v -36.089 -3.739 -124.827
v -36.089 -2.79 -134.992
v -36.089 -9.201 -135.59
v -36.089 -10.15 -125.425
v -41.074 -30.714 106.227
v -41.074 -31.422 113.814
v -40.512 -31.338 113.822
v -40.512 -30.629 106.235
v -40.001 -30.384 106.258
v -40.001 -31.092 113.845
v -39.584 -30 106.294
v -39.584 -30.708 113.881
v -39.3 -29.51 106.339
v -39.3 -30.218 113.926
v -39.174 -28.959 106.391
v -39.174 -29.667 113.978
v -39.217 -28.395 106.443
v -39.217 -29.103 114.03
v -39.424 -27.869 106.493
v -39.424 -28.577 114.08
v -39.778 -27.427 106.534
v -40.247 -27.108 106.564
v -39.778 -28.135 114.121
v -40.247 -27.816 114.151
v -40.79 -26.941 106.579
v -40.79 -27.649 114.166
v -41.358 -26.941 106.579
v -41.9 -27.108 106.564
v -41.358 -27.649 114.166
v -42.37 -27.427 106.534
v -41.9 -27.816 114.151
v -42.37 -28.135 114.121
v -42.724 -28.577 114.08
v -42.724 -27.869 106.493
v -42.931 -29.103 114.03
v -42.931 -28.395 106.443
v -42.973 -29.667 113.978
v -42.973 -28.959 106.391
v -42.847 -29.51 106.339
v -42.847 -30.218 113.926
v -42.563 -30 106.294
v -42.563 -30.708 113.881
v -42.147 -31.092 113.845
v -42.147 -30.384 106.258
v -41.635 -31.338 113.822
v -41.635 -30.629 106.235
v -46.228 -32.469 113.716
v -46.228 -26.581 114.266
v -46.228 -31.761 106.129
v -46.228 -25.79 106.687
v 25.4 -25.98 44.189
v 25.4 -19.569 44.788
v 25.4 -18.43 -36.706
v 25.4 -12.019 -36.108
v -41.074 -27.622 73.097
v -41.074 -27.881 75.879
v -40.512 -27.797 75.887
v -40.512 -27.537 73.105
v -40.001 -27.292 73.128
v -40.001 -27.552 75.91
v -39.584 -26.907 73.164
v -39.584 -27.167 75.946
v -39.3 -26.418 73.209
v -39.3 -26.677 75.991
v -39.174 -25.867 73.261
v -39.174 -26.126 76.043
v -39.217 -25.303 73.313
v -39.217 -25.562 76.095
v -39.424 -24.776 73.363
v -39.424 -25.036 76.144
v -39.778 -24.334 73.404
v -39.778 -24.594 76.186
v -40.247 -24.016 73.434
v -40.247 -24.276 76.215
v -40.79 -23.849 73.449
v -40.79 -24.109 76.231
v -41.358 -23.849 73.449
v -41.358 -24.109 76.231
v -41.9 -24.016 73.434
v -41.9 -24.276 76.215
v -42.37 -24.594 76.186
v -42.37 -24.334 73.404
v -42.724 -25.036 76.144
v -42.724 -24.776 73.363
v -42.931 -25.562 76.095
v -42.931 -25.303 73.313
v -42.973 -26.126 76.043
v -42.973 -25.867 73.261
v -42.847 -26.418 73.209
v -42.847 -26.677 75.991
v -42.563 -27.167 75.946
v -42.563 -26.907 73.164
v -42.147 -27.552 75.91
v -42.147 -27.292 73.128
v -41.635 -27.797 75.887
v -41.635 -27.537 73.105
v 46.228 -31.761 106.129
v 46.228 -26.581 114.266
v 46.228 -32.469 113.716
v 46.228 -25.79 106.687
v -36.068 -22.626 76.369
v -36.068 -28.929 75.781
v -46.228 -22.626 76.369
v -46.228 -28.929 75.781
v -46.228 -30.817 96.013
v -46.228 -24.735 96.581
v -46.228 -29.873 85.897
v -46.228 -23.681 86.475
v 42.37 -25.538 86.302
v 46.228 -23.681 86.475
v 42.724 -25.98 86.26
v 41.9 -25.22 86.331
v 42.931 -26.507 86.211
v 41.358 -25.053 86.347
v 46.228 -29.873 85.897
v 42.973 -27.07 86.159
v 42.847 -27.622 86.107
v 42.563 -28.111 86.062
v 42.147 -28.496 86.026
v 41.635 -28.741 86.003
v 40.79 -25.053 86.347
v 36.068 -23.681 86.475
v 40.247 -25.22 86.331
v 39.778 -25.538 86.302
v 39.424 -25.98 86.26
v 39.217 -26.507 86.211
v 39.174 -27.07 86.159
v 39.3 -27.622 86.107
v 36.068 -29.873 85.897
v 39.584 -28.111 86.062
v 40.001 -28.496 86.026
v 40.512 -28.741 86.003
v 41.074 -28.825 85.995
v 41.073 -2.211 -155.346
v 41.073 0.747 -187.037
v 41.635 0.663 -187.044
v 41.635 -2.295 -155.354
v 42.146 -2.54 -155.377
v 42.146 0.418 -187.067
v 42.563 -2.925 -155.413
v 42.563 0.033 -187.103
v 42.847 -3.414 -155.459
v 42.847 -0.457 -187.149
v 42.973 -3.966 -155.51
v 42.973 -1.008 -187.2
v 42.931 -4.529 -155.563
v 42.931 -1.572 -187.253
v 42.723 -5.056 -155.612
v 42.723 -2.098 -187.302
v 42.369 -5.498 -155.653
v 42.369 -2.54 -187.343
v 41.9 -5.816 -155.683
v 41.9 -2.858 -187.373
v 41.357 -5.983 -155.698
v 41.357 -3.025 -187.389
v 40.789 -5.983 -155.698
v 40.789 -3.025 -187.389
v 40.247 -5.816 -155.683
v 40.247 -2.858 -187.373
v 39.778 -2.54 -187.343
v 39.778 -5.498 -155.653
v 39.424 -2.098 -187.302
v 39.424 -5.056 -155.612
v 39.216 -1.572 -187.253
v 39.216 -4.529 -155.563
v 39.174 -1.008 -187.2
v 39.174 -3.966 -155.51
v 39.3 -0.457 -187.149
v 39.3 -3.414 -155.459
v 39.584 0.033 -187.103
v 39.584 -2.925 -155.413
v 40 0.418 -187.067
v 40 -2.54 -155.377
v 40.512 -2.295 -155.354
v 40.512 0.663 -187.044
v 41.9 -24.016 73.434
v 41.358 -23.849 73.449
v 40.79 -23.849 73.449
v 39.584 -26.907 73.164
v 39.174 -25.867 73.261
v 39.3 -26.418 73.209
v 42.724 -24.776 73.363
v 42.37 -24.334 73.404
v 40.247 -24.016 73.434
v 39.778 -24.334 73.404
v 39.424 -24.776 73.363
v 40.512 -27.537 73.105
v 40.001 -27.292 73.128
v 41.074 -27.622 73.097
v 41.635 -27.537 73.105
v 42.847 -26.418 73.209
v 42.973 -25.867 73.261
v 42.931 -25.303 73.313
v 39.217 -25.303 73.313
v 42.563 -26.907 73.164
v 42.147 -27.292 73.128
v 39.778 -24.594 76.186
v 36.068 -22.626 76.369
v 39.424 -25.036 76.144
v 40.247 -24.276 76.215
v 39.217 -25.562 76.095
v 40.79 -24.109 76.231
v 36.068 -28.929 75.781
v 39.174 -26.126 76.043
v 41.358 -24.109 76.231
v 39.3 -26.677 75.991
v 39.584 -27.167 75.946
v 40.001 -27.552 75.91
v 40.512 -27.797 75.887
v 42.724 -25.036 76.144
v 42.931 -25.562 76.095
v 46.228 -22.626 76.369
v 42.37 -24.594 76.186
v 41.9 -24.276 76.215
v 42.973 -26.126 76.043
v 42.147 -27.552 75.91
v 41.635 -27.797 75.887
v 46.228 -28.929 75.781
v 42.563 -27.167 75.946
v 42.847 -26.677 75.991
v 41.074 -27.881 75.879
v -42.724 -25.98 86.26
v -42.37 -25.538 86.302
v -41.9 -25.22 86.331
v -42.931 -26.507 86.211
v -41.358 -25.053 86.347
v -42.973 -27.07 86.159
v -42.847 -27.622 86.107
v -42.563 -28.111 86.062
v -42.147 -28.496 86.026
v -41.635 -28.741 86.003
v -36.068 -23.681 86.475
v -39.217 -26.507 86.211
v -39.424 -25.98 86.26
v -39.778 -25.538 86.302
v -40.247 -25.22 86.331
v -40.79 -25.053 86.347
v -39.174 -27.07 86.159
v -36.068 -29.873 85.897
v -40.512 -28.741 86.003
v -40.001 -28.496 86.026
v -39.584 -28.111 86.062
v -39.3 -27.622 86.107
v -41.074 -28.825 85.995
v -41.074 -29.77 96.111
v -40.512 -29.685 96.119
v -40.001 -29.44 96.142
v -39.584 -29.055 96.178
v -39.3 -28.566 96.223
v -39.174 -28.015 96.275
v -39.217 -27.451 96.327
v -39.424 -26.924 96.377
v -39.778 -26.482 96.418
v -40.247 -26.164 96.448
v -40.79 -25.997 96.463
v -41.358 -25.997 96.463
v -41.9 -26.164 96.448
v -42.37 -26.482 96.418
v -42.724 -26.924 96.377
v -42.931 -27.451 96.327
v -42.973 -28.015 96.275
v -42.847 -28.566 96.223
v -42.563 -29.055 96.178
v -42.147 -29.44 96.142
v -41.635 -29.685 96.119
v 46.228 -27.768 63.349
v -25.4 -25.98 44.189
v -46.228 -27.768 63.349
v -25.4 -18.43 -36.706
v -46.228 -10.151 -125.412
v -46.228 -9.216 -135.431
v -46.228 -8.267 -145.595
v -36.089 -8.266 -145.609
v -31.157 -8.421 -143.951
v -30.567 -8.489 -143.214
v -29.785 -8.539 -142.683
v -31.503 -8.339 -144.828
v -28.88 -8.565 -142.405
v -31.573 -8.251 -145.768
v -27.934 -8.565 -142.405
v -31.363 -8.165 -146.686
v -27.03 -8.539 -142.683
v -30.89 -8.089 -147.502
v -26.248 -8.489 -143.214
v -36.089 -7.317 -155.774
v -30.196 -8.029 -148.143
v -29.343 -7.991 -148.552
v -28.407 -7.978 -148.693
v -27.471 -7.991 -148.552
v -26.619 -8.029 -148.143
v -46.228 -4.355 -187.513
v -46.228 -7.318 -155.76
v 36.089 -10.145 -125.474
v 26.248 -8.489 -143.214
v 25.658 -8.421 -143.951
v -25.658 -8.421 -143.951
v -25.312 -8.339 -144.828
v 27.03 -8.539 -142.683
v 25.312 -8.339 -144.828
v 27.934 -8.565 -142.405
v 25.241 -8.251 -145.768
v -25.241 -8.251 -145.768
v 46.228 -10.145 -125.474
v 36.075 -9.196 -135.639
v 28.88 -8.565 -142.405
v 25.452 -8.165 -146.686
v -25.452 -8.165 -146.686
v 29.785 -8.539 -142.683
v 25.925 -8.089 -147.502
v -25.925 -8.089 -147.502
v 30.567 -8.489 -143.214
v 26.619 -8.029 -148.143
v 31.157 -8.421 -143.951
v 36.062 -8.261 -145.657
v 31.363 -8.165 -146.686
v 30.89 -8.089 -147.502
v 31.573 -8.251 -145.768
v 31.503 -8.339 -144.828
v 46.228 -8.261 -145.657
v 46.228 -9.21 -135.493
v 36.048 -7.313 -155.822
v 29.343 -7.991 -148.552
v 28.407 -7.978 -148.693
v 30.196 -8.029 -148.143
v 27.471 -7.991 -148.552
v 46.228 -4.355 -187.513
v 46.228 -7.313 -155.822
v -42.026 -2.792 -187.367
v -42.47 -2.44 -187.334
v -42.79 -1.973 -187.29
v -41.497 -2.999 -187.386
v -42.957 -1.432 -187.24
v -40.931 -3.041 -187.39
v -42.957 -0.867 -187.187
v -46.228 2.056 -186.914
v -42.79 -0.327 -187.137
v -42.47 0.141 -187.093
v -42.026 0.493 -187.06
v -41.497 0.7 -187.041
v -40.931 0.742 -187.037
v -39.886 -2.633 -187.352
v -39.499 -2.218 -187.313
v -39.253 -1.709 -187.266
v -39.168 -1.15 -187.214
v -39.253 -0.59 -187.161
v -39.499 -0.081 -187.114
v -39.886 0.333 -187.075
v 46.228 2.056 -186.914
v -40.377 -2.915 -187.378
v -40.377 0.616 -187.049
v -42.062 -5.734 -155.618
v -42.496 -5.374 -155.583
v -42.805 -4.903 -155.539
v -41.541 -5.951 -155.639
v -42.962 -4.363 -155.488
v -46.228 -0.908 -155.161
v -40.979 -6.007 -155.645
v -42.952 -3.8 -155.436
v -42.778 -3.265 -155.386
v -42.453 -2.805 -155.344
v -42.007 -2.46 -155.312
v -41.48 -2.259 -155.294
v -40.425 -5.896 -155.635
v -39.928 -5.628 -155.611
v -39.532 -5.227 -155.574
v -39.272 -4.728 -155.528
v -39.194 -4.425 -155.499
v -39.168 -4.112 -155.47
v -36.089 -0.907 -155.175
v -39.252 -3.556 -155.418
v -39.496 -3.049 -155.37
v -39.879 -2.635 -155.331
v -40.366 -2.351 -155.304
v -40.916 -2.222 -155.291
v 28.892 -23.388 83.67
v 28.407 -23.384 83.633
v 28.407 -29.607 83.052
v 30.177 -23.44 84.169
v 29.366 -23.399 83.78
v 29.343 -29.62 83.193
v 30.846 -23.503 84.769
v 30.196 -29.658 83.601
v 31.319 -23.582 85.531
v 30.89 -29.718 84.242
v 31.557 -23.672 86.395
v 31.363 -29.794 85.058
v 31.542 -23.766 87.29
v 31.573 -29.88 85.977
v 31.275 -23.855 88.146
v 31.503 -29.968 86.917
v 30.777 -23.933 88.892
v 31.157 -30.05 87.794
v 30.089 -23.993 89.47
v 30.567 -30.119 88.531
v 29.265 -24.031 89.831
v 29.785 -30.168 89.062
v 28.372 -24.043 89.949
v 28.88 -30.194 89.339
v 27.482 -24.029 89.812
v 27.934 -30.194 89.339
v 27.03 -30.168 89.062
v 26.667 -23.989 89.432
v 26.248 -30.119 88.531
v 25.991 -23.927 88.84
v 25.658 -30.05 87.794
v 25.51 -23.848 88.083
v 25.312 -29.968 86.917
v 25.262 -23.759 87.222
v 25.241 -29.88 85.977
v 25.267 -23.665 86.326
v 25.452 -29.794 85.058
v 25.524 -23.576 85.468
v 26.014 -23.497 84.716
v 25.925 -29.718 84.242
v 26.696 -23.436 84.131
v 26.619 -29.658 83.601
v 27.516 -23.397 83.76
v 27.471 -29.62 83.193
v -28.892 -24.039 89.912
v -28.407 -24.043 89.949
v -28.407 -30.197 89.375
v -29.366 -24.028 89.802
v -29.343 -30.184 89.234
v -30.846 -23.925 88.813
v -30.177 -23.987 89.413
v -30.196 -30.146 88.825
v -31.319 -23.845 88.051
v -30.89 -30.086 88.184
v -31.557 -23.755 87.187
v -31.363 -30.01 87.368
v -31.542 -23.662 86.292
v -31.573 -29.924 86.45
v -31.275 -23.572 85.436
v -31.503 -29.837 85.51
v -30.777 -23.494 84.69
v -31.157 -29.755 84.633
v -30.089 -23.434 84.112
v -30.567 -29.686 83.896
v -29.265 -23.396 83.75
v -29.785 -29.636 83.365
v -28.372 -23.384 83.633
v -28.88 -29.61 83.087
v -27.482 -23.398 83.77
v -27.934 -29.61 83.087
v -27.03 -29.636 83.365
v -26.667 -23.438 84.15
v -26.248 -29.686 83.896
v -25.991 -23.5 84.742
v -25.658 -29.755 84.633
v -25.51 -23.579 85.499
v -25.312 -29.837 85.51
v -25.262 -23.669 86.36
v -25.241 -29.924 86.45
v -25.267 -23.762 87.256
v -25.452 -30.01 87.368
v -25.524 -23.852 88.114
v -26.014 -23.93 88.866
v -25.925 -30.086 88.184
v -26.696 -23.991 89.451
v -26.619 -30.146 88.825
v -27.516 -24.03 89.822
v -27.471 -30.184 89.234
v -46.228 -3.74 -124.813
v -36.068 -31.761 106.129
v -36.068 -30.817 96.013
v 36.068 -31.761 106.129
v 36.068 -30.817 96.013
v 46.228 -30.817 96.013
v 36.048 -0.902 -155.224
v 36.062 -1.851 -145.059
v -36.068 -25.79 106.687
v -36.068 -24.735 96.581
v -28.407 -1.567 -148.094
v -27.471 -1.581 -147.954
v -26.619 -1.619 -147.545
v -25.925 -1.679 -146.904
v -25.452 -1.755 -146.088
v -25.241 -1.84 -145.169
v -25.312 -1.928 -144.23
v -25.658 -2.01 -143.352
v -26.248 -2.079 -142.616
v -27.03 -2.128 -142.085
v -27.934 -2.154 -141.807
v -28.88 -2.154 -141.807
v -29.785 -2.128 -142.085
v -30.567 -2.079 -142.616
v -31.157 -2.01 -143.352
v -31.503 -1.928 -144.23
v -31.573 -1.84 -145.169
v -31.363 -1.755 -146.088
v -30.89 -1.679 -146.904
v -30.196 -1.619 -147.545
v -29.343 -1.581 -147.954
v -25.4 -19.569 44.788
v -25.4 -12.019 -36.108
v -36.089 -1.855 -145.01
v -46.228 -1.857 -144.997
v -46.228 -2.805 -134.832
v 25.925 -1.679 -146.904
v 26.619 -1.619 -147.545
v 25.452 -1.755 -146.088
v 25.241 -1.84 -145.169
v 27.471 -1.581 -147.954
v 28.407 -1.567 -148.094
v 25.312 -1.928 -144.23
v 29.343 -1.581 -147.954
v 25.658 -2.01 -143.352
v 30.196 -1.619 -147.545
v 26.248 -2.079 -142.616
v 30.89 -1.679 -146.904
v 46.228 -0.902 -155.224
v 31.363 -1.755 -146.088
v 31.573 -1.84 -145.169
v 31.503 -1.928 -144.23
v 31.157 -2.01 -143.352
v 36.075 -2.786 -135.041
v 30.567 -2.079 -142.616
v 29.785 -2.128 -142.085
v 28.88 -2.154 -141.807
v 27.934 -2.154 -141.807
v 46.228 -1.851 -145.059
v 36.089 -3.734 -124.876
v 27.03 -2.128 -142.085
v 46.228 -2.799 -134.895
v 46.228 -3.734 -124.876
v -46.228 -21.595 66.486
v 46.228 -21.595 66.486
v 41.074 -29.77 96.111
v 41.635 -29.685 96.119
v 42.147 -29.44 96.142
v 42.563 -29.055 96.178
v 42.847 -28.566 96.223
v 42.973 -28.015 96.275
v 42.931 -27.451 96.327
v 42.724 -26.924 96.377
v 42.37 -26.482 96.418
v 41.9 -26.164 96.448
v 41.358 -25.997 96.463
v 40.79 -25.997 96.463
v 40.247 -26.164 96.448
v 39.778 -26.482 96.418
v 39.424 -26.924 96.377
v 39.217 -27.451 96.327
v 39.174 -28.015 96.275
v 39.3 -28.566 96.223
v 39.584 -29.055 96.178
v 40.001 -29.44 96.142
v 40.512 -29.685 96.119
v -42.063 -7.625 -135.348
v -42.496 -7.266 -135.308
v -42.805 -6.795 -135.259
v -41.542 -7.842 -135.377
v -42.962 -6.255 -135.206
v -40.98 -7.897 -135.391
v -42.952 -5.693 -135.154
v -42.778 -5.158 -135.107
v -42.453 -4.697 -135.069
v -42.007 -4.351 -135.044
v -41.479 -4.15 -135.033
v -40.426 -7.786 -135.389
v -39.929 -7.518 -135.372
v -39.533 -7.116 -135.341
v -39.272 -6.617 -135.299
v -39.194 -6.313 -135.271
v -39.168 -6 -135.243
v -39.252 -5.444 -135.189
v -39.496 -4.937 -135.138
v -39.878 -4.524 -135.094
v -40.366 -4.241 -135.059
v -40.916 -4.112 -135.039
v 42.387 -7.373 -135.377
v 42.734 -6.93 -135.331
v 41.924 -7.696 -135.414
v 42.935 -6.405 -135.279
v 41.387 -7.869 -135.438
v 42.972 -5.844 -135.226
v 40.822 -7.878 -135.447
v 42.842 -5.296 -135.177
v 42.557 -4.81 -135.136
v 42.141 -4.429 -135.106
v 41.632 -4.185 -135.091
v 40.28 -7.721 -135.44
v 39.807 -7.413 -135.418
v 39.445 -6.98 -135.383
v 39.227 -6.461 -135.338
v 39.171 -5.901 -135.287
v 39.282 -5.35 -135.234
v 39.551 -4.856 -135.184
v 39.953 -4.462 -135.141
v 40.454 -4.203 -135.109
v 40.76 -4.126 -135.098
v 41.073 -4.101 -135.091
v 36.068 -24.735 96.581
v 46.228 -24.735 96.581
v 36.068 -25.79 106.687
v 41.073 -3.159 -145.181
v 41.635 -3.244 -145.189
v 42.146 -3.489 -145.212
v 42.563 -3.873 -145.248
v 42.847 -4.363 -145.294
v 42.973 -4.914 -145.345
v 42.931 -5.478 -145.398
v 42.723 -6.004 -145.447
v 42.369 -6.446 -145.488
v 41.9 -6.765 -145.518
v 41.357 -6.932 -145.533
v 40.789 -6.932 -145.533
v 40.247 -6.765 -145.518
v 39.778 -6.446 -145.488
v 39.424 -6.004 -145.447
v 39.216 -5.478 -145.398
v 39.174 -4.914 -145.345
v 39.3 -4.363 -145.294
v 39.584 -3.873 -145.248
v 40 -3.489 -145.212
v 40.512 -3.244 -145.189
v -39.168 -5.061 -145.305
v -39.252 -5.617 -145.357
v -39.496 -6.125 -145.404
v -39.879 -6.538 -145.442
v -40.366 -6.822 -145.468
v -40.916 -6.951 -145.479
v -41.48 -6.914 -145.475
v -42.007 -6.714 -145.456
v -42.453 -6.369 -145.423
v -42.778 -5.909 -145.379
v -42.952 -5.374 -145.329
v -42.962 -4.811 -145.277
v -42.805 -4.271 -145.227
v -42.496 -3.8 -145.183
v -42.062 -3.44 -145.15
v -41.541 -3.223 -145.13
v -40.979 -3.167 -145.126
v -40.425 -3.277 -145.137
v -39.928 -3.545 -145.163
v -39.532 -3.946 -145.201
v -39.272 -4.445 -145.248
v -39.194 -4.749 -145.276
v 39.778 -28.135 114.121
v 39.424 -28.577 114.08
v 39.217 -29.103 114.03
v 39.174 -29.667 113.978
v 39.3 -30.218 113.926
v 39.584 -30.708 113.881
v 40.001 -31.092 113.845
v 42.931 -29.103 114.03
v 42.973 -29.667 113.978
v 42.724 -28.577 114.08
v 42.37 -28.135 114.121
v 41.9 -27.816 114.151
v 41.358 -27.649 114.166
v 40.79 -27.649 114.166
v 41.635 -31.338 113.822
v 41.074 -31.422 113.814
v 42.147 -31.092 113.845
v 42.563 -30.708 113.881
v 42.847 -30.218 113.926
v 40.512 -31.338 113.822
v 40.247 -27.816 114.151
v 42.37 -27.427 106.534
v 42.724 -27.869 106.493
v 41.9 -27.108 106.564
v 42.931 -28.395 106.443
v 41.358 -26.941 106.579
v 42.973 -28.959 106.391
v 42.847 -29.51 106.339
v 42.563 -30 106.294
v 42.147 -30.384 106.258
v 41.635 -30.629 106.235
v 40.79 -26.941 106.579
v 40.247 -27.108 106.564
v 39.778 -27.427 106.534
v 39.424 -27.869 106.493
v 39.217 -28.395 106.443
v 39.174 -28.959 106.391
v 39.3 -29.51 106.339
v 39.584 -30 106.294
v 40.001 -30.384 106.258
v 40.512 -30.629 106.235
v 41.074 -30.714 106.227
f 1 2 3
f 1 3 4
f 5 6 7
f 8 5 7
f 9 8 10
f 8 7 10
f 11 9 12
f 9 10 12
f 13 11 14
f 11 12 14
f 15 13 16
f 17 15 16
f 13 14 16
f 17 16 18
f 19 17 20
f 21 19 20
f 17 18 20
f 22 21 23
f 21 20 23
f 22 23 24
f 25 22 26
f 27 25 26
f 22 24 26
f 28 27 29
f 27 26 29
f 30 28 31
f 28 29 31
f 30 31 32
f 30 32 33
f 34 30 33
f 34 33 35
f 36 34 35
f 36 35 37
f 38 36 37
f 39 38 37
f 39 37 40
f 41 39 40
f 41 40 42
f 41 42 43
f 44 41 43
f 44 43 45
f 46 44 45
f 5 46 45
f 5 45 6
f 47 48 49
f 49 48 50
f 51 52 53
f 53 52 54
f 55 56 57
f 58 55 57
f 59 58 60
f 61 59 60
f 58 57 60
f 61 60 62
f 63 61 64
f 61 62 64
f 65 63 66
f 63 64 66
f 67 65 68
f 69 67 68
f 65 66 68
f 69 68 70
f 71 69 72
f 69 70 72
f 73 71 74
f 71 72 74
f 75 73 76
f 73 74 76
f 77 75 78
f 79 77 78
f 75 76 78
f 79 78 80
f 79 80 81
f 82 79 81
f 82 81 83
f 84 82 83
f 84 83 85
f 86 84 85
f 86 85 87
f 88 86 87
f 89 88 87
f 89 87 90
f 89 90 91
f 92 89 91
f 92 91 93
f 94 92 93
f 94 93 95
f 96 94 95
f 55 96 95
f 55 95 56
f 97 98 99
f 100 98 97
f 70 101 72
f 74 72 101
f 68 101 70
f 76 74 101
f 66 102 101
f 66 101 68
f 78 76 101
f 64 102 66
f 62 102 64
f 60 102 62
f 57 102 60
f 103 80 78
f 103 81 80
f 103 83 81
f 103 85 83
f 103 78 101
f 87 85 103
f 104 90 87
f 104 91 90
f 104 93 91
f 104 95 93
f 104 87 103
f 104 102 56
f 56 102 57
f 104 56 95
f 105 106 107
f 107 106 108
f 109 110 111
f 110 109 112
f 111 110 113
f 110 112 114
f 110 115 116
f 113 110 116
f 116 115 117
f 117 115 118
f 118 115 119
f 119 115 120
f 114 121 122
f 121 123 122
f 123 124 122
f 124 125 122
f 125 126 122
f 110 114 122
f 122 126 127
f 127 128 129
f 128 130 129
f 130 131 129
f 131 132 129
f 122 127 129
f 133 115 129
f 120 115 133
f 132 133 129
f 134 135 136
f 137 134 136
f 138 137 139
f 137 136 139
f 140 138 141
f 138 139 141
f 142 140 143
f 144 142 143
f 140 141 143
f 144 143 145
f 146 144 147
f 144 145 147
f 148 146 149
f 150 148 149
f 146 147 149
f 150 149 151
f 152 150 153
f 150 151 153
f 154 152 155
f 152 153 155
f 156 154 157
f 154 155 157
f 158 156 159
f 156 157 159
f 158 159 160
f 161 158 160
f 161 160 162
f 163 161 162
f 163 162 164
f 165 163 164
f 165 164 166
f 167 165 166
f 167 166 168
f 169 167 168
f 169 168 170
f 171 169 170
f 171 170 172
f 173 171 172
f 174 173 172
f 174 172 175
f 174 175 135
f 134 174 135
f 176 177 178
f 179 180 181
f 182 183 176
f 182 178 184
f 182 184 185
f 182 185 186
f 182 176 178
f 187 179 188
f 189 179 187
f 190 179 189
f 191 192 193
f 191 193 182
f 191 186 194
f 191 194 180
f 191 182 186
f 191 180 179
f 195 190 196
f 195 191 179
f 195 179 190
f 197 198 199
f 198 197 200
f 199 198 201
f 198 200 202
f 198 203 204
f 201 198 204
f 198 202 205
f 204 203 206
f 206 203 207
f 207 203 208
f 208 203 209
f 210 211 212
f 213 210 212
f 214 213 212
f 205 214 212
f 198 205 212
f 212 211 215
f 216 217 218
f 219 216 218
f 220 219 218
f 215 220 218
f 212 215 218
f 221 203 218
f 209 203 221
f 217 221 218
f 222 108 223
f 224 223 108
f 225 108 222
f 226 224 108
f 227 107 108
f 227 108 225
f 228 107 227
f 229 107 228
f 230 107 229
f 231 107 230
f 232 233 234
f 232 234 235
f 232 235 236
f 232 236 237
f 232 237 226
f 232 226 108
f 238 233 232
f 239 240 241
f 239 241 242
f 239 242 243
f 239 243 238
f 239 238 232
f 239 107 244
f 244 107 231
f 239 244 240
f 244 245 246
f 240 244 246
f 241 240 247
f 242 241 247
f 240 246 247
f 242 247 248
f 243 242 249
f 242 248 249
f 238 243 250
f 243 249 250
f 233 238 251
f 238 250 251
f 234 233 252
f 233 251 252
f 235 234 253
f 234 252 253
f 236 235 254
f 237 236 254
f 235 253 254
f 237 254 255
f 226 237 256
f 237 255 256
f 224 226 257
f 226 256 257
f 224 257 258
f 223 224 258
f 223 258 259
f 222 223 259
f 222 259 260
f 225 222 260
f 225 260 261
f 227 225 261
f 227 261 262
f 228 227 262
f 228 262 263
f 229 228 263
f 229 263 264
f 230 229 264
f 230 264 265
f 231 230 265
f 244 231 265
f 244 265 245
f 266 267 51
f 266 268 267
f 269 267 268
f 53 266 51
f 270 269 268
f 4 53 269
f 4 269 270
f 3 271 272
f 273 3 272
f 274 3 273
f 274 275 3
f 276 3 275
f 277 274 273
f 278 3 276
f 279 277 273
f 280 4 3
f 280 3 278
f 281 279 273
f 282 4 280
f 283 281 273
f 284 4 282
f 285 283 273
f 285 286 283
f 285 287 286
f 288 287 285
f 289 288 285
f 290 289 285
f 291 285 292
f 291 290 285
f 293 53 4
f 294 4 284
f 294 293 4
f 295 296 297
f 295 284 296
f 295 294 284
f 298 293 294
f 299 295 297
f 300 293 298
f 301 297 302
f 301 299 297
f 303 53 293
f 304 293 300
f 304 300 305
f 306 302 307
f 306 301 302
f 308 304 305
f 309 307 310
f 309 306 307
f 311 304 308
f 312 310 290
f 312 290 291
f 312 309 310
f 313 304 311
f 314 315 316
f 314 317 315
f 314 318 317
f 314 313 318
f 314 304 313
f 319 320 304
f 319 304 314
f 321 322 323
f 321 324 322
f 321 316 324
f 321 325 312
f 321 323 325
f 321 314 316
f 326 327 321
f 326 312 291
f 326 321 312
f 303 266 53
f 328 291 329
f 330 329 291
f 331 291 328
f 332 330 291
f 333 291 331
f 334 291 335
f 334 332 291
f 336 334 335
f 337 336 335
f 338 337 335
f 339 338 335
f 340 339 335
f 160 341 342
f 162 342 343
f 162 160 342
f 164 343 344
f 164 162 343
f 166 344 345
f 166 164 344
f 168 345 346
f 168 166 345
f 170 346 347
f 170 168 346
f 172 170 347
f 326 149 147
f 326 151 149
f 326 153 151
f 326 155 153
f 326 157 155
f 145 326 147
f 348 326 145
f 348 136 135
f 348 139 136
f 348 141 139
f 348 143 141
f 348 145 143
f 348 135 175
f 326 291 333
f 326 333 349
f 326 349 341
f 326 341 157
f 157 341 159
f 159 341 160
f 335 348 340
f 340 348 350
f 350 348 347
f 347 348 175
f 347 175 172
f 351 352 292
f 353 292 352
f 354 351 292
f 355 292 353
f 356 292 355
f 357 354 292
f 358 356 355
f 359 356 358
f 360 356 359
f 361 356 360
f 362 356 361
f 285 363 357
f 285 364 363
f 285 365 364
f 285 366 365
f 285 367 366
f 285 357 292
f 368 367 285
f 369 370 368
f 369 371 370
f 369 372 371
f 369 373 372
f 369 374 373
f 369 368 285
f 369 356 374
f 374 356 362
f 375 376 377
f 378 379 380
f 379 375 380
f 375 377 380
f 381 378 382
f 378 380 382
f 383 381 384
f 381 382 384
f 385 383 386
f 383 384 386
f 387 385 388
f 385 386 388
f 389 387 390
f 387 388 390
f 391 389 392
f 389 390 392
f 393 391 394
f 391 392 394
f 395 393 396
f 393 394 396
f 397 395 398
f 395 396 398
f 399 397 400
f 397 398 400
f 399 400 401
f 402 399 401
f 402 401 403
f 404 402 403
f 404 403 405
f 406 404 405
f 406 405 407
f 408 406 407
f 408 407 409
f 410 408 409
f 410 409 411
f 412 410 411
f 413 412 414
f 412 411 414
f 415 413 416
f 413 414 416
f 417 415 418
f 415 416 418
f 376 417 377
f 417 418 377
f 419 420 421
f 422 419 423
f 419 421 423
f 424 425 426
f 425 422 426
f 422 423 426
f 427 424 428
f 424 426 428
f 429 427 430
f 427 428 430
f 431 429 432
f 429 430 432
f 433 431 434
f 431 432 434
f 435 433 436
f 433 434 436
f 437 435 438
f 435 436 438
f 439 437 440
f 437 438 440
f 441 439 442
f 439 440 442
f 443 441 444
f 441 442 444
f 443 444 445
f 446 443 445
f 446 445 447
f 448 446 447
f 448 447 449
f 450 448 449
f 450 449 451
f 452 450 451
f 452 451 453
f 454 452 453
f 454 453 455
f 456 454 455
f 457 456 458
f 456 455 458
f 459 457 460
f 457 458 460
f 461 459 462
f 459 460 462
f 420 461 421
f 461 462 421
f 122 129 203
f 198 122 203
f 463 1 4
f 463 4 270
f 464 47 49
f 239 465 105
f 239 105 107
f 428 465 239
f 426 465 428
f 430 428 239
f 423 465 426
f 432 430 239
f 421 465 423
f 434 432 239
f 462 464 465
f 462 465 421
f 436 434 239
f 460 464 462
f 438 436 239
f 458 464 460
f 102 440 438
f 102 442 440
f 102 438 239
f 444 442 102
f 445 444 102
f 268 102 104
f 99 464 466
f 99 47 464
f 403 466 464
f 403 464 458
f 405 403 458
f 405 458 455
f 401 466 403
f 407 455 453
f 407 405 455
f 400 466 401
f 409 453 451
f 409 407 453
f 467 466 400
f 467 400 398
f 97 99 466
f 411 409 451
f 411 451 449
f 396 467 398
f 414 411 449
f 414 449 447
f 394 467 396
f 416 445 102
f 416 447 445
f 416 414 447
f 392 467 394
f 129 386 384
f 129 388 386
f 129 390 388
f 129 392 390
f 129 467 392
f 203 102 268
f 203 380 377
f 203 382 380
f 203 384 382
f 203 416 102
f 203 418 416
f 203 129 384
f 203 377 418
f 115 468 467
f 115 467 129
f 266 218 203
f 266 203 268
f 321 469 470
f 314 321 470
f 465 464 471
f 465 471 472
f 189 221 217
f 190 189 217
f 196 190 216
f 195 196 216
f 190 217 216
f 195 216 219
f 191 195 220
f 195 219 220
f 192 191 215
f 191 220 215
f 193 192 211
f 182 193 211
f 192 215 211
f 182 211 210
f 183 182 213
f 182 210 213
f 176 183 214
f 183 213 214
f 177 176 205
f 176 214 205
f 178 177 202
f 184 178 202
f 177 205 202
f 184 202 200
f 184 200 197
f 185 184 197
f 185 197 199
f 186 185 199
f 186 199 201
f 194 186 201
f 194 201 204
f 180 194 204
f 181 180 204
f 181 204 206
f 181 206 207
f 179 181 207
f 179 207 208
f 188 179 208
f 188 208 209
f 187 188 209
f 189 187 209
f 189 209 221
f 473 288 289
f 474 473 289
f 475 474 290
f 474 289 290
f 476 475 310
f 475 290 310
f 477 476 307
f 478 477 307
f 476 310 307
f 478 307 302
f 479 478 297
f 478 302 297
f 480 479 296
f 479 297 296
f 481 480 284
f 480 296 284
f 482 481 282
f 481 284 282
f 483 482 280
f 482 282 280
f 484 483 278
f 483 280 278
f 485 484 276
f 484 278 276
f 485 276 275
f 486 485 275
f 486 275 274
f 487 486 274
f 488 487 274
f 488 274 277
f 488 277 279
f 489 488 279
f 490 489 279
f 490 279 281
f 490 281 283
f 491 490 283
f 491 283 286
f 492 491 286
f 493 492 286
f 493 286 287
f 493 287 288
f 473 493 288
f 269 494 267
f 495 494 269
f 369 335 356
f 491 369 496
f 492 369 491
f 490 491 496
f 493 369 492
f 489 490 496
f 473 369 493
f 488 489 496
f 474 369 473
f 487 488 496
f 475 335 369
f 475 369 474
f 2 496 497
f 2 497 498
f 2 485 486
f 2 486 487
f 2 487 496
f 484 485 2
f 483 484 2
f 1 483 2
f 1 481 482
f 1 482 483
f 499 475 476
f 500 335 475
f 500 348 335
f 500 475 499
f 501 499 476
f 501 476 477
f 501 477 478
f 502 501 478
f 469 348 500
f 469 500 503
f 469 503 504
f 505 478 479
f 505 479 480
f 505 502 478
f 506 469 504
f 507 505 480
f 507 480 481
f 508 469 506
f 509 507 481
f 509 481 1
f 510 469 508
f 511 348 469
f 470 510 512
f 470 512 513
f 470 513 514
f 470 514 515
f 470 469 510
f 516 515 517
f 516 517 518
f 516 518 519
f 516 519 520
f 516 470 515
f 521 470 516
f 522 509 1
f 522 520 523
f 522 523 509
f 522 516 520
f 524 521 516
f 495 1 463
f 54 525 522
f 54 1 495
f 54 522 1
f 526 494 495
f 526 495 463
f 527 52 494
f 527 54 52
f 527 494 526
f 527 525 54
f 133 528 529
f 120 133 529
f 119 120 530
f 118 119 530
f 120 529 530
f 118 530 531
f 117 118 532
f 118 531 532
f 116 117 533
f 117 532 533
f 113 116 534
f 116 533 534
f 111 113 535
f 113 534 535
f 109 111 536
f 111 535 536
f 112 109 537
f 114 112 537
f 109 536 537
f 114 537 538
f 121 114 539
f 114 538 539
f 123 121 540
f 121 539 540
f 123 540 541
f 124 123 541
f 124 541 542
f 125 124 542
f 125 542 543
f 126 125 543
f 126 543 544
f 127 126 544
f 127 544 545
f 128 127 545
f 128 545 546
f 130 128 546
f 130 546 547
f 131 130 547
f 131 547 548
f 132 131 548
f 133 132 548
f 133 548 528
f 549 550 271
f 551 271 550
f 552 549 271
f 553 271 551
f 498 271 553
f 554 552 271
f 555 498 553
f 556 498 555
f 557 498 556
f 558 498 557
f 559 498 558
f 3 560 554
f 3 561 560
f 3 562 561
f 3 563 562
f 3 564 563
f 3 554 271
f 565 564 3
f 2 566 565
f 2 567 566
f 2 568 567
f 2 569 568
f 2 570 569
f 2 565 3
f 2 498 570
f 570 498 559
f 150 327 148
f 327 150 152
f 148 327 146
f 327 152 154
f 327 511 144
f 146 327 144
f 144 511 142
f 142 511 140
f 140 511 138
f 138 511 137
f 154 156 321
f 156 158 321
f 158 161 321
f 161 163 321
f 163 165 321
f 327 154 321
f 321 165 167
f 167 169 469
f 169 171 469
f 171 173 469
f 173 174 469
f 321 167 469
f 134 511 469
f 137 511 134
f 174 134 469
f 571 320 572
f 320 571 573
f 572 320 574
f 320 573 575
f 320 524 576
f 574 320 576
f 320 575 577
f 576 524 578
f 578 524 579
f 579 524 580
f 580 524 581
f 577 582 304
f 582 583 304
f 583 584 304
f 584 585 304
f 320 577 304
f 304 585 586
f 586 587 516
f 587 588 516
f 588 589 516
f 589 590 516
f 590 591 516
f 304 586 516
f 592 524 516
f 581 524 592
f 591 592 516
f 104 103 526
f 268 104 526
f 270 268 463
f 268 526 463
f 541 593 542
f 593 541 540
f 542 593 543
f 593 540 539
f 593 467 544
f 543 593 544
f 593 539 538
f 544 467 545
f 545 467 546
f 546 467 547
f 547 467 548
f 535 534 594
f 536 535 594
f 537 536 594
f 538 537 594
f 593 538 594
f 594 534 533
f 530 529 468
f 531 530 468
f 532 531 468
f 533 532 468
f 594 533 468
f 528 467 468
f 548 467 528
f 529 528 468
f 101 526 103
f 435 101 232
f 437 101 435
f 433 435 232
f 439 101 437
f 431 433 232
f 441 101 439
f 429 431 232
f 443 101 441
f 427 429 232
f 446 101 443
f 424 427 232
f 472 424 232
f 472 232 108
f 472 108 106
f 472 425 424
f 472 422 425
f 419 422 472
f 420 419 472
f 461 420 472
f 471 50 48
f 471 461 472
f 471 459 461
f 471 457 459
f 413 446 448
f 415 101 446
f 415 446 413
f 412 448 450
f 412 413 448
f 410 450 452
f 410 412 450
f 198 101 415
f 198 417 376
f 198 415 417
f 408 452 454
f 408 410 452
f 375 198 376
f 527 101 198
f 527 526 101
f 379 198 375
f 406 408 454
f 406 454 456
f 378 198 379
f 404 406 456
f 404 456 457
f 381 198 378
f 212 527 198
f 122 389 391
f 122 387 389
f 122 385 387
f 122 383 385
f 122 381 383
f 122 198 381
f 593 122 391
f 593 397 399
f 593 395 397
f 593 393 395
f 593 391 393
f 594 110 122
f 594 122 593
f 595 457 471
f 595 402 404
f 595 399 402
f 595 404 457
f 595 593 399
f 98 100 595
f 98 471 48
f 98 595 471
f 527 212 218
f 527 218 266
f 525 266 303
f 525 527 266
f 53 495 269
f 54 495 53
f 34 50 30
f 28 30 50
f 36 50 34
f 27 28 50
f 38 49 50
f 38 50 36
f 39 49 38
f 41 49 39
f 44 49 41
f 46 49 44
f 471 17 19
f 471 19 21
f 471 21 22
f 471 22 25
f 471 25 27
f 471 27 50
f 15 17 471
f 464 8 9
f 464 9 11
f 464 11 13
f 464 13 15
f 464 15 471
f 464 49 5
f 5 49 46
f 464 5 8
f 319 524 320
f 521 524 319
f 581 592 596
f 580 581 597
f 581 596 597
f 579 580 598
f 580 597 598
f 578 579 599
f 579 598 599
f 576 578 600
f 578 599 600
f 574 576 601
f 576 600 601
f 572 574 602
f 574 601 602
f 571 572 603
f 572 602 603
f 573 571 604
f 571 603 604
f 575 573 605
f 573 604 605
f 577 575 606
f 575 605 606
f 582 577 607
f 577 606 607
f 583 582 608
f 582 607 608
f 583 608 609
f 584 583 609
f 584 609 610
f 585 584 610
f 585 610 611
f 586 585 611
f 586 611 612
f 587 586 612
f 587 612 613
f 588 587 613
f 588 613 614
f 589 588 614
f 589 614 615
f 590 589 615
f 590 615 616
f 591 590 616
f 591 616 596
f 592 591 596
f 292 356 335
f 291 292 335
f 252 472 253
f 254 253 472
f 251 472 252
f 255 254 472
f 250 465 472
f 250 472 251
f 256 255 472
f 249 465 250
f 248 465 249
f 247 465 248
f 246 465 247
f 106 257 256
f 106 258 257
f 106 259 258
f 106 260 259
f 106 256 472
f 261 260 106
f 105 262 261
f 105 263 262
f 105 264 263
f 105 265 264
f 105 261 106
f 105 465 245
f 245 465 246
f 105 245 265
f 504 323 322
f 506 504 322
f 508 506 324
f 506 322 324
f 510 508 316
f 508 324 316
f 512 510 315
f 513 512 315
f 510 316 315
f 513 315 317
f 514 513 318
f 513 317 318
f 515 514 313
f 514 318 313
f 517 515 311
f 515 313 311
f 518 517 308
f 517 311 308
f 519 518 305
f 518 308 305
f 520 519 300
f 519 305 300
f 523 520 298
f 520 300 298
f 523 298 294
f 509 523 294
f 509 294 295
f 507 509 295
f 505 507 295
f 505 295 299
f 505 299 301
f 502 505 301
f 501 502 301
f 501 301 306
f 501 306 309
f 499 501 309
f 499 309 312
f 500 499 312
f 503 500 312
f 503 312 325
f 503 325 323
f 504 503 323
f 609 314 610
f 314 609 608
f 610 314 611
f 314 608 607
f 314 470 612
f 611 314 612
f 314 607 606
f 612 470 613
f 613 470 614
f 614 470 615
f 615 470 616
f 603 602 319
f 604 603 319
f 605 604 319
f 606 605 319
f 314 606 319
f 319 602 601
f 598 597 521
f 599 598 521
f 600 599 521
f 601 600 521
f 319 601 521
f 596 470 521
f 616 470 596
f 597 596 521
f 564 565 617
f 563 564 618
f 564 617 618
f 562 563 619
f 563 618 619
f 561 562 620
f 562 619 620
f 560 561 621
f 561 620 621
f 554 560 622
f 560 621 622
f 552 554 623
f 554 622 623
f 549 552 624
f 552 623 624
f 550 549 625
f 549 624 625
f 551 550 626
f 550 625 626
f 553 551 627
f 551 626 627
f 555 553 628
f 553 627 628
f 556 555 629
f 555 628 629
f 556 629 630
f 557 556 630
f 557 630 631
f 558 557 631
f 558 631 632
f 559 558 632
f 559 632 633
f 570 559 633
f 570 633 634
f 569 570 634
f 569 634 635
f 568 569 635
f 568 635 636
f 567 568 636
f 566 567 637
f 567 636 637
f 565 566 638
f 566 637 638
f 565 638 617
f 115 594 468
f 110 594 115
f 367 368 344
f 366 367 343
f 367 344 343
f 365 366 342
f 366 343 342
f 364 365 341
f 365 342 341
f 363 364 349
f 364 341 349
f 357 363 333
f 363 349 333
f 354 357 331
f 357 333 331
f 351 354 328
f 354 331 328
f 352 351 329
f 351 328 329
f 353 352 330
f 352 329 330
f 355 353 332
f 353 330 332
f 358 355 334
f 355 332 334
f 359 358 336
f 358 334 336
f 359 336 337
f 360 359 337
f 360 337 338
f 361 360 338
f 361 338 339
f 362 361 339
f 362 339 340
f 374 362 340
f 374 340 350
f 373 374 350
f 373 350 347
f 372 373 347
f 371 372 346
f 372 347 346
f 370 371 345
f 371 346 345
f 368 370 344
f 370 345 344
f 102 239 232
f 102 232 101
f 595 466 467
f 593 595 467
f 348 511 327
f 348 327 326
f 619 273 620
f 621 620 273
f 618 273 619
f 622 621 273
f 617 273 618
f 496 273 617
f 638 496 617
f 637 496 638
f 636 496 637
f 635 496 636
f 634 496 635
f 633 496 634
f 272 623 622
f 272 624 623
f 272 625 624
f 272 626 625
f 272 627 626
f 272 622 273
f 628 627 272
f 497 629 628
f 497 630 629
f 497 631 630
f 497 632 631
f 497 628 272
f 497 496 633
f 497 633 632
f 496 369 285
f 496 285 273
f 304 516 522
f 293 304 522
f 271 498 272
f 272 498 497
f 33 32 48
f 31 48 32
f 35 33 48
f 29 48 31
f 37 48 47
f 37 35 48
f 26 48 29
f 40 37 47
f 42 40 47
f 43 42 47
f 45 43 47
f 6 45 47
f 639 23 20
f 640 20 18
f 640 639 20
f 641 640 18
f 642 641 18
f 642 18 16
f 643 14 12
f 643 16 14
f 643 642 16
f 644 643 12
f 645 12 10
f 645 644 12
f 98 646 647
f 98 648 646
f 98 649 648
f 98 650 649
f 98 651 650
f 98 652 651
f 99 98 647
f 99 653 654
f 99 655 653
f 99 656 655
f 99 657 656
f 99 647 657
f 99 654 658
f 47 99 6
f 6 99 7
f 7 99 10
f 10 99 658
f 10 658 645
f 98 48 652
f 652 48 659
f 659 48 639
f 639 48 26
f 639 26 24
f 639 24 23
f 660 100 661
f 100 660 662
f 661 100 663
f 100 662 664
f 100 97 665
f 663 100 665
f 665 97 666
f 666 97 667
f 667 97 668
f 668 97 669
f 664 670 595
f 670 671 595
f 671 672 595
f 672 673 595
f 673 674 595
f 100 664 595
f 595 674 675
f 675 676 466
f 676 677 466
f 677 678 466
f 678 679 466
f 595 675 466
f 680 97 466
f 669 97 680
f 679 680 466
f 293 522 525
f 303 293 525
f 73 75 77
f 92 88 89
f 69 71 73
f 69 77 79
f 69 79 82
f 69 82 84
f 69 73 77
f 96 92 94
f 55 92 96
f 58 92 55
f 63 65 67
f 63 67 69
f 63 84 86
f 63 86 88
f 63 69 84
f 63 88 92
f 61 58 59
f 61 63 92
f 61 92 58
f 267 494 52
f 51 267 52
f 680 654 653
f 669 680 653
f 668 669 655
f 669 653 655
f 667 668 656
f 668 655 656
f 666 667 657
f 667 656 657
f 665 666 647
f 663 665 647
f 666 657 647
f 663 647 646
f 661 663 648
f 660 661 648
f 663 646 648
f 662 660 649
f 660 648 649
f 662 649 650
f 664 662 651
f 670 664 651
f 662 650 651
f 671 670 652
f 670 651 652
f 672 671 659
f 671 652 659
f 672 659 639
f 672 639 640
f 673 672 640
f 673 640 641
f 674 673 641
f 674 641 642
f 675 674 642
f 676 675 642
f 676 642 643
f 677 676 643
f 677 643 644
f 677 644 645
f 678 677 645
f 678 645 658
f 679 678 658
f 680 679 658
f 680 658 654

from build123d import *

# Parameters (mm, degrees)
FRAME_DEPTH              = 46.228
SKETCH7_W                = 50.8
SKETCH7_H                = 81.247188803
BATTERY_SLOT_DEPTH       = 32.131
EXTRUDE25_DEPTH          = 12.7
LOW_A_ARM_MOUNTING_DEPTH = 8.128
REAR_HINGE_HOLES_REACH   = 309.358
SKETCH25_R               = 1.905
SKETCH33_R               = 3.175
EXTRUDE23_DEPTH          = 9.652
SKETCH32_R               = 3.175
EXTRUDE24_DEPTH          = 9.652
SKETCH34_R               = 1.905
EXTRUDE26_DEPTH          = 40.894


with BuildPart() as part:
    # Sketch2 → Frame (new, symmetric)
    with BuildSketch(Plane(origin=(0, 0, 0), x_dir=(0, 0, -1), z_dir=(1, 0, 0))):
        Polygon((-113.716301345, -32.469135694), (-63.34929575, -27.768288573), (187.512811896, -4.354857448), (186.914499493, 2.05573268), (-66.485612868, -21.594575186), (-114.265856874, -26.580948798), align=None)
    extrude(amount=FRAME_DEPTH, both=True)

    # Sketch7 → Battery Slot (cut)
    with BuildSketch(Plane(origin=(0, -15.256451714, -1.42391326), x_dir=(1, 0, 0), z_dir=(0, 0.9956728299897474, 0.09292801310803929))):
        with Locations((0, -5.788843516)):
            Rectangle(SKETCH7_W, SKETCH7_H)
    extrude(amount=-BATTERY_SLOT_DEPTH, mode=Mode.SUBTRACT)

    # Sketch20 → Extrude25 (cut)
    with BuildSketch(Plane(origin=(0, -21.667041842, -2.022225663), x_dir=(1, 0, 0), z_dir=(0, -0.9956728299897474, -0.09292801310803922))):
        Polygon((54.692263435, 108.621523843), (36.068, 108.621523843), (36.068, 98.461523843), (48.857667711, 98.461523843), (48.857667711, 88.301523843), (36.068, 88.301523843), (36.068, 78.141523843), (53.624725675, 78.141523843), align=None)
        Polygon((-53.624725675, 78.141523843), (-54.692263435, 108.621523843), (-36.068, 108.621523843), (-36.068, 98.461523843), (-48.857667711, 98.461523843), (-48.857667711, 88.301523843), (-36.068, 88.301523843), (-36.068, 78.141523843), align=None)
    extrude(amount=-EXTRUDE25_DEPTH, mode=Mode.SUBTRACT)

    # Sketch24 → Low A-Arm Mounting (cut)
    with BuildSketch(Plane(origin=(0, -15.256451714, -1.42391326), x_dir=(1, 0, 0), z_dir=(0, 0.9956728299897474, 0.09292801310803929))):
        Polygon((56.409110401, 123.988548499), (56.409110401, 154.468520321), (36.047664653, 154.468520321), (36.061546605, 144.259475636), (46.249110401, 144.259475636), (46.249110401, 134.050421513), (36.07522845, 134.197593184), (36.089110401, 123.988548499), align=None)
        Polygon((-36.089110402, 123.939475636), (-56.409091616, 123.911845137), (-56.450537326, 154.39178878), (-36.089110402, 154.419475636), (-36.089110402, 144.210421513), (-46.27666478, 144.196568783), (-46.262782828, 133.987524098), (-36.089110402, 134.148529759), align=None)
    extrude(amount=-LOW_A_ARM_MOUNTING_DEPTH, mode=Mode.SUBTRACT)

    # Rear Hinge Holes: up to this face of the body (flat: up to its plane)
    rear_hinge_holes_end = Plane(part.part.faces().sort_by_distance((41.158555201, -6.939737318, -125.175098432))[0])
    # Sketch25 → Rear Hinge Holes (cut, up to the picked face)
    with BuildSketch(Plane(origin=(0, 17.312184394, -185.490586234), x_dir=(-1, 0, 0), z_dir=(0, 0.09292801310803887, -0.9956728299897473)), mode=Mode.PRIVATE) as rear_hinge_holes_sk1:
        with Locations(Location((-41.073322363, -18.541981083, 0), (0, 0, 90))):
            Circle(SKETCH25_R)
    rear_hinge_holes_tool1 = split(extrude(rear_hinge_holes_sk1.sketch, amount=-REAR_HINGE_HOLES_REACH, mode=Mode.PRIVATE), bisect_by=rear_hinge_holes_end, keep=Keep.BOTH, mode=Mode.PRIVATE)
    # Sketch25 → Rear Hinge Holes (cut, up to the picked face)
    with BuildSketch(Plane(origin=(0, 17.312184394, -185.490586234), x_dir=(-1, 0, 0), z_dir=(0, 0.09292801310803887, -0.9956728299897473)), mode=Mode.PRIVATE) as rear_hinge_holes_sk2:
        with Locations(Location((41.073322363, -18.541981083, 0), (0, 0, 180))):
            Circle(SKETCH25_R)
    rear_hinge_holes_tool2 = split(extrude(rear_hinge_holes_sk2.sketch, amount=-REAR_HINGE_HOLES_REACH, mode=Mode.PRIVATE), bisect_by=rear_hinge_holes_end, keep=Keep.BOTH, mode=Mode.PRIVATE)
    add(rear_hinge_holes_tool1.solids().sort_by(Axis((41.073322, -1.149562, -187.213656), (0, -0.09292801310803887, 0.9956728299897473)))[0], mode=Mode.SUBTRACT)
    add(rear_hinge_holes_tool2.solids().sort_by(Axis((-41.073322, -1.149562, -187.213656), (0, -0.09292801310803887, 0.9956728299897473)))[0], mode=Mode.SUBTRACT)

    # Sketch33 → Extrude23 (cut)
    with BuildSketch(Plane(origin=(0, -21.667041842, -2.022225663), x_dir=(1, 0, 0), z_dir=(0, -0.9956728299897473, -0.09292801310803925))):
        with Locations(Location((28.407237147, -144.13272383, 0), (0, 0, 270))):
            Circle(SKETCH33_R)
        with Locations(Location((-28.407237147, -144.13272383, 0), (0, 0, 270))):
            Circle(SKETCH33_R)
    extrude(amount=-EXTRUDE23_DEPTH, mode=Mode.SUBTRACT)

    # Sketch32 → Extrude24 (cut)
    with BuildSketch(Plane(origin=(0, -21.667041842, -2.022225663), x_dir=(1, 0, 0), z_dir=(0, -0.9956728299897473, -0.0929280131080392))):
        with Locations(Location((28.407237147, 88.619023843, 0), (0, 0, 270))):
            Circle(SKETCH32_R)
        with Locations(Location((-28.407237147, 88.619023843, 0), (0, 0, 90))):
            Circle(SKETCH32_R)
    extrude(amount=-EXTRUDE24_DEPTH, mode=Mode.SUBTRACT)

    # Sketch34 → Extrude26 (cut)
    with BuildSketch(Plane(origin=(0, -10.802093851, 115.738527007), x_dir=(1, 0, 0), z_dir=(0, -0.09292801310803855, 0.9956728299897473))):
        with Locations(Location((-41.073774155, -18.804317875, 0), (0, 0, 270))):
            Circle(SKETCH34_R)
        with Locations(Location((41.073774155, -18.804317875, 0), (0, 0, 270))):
            Circle(SKETCH34_R)
    extrude(amount=-EXTRUDE26_DEPTH, mode=Mode.SUBTRACT)


solid = part.part
